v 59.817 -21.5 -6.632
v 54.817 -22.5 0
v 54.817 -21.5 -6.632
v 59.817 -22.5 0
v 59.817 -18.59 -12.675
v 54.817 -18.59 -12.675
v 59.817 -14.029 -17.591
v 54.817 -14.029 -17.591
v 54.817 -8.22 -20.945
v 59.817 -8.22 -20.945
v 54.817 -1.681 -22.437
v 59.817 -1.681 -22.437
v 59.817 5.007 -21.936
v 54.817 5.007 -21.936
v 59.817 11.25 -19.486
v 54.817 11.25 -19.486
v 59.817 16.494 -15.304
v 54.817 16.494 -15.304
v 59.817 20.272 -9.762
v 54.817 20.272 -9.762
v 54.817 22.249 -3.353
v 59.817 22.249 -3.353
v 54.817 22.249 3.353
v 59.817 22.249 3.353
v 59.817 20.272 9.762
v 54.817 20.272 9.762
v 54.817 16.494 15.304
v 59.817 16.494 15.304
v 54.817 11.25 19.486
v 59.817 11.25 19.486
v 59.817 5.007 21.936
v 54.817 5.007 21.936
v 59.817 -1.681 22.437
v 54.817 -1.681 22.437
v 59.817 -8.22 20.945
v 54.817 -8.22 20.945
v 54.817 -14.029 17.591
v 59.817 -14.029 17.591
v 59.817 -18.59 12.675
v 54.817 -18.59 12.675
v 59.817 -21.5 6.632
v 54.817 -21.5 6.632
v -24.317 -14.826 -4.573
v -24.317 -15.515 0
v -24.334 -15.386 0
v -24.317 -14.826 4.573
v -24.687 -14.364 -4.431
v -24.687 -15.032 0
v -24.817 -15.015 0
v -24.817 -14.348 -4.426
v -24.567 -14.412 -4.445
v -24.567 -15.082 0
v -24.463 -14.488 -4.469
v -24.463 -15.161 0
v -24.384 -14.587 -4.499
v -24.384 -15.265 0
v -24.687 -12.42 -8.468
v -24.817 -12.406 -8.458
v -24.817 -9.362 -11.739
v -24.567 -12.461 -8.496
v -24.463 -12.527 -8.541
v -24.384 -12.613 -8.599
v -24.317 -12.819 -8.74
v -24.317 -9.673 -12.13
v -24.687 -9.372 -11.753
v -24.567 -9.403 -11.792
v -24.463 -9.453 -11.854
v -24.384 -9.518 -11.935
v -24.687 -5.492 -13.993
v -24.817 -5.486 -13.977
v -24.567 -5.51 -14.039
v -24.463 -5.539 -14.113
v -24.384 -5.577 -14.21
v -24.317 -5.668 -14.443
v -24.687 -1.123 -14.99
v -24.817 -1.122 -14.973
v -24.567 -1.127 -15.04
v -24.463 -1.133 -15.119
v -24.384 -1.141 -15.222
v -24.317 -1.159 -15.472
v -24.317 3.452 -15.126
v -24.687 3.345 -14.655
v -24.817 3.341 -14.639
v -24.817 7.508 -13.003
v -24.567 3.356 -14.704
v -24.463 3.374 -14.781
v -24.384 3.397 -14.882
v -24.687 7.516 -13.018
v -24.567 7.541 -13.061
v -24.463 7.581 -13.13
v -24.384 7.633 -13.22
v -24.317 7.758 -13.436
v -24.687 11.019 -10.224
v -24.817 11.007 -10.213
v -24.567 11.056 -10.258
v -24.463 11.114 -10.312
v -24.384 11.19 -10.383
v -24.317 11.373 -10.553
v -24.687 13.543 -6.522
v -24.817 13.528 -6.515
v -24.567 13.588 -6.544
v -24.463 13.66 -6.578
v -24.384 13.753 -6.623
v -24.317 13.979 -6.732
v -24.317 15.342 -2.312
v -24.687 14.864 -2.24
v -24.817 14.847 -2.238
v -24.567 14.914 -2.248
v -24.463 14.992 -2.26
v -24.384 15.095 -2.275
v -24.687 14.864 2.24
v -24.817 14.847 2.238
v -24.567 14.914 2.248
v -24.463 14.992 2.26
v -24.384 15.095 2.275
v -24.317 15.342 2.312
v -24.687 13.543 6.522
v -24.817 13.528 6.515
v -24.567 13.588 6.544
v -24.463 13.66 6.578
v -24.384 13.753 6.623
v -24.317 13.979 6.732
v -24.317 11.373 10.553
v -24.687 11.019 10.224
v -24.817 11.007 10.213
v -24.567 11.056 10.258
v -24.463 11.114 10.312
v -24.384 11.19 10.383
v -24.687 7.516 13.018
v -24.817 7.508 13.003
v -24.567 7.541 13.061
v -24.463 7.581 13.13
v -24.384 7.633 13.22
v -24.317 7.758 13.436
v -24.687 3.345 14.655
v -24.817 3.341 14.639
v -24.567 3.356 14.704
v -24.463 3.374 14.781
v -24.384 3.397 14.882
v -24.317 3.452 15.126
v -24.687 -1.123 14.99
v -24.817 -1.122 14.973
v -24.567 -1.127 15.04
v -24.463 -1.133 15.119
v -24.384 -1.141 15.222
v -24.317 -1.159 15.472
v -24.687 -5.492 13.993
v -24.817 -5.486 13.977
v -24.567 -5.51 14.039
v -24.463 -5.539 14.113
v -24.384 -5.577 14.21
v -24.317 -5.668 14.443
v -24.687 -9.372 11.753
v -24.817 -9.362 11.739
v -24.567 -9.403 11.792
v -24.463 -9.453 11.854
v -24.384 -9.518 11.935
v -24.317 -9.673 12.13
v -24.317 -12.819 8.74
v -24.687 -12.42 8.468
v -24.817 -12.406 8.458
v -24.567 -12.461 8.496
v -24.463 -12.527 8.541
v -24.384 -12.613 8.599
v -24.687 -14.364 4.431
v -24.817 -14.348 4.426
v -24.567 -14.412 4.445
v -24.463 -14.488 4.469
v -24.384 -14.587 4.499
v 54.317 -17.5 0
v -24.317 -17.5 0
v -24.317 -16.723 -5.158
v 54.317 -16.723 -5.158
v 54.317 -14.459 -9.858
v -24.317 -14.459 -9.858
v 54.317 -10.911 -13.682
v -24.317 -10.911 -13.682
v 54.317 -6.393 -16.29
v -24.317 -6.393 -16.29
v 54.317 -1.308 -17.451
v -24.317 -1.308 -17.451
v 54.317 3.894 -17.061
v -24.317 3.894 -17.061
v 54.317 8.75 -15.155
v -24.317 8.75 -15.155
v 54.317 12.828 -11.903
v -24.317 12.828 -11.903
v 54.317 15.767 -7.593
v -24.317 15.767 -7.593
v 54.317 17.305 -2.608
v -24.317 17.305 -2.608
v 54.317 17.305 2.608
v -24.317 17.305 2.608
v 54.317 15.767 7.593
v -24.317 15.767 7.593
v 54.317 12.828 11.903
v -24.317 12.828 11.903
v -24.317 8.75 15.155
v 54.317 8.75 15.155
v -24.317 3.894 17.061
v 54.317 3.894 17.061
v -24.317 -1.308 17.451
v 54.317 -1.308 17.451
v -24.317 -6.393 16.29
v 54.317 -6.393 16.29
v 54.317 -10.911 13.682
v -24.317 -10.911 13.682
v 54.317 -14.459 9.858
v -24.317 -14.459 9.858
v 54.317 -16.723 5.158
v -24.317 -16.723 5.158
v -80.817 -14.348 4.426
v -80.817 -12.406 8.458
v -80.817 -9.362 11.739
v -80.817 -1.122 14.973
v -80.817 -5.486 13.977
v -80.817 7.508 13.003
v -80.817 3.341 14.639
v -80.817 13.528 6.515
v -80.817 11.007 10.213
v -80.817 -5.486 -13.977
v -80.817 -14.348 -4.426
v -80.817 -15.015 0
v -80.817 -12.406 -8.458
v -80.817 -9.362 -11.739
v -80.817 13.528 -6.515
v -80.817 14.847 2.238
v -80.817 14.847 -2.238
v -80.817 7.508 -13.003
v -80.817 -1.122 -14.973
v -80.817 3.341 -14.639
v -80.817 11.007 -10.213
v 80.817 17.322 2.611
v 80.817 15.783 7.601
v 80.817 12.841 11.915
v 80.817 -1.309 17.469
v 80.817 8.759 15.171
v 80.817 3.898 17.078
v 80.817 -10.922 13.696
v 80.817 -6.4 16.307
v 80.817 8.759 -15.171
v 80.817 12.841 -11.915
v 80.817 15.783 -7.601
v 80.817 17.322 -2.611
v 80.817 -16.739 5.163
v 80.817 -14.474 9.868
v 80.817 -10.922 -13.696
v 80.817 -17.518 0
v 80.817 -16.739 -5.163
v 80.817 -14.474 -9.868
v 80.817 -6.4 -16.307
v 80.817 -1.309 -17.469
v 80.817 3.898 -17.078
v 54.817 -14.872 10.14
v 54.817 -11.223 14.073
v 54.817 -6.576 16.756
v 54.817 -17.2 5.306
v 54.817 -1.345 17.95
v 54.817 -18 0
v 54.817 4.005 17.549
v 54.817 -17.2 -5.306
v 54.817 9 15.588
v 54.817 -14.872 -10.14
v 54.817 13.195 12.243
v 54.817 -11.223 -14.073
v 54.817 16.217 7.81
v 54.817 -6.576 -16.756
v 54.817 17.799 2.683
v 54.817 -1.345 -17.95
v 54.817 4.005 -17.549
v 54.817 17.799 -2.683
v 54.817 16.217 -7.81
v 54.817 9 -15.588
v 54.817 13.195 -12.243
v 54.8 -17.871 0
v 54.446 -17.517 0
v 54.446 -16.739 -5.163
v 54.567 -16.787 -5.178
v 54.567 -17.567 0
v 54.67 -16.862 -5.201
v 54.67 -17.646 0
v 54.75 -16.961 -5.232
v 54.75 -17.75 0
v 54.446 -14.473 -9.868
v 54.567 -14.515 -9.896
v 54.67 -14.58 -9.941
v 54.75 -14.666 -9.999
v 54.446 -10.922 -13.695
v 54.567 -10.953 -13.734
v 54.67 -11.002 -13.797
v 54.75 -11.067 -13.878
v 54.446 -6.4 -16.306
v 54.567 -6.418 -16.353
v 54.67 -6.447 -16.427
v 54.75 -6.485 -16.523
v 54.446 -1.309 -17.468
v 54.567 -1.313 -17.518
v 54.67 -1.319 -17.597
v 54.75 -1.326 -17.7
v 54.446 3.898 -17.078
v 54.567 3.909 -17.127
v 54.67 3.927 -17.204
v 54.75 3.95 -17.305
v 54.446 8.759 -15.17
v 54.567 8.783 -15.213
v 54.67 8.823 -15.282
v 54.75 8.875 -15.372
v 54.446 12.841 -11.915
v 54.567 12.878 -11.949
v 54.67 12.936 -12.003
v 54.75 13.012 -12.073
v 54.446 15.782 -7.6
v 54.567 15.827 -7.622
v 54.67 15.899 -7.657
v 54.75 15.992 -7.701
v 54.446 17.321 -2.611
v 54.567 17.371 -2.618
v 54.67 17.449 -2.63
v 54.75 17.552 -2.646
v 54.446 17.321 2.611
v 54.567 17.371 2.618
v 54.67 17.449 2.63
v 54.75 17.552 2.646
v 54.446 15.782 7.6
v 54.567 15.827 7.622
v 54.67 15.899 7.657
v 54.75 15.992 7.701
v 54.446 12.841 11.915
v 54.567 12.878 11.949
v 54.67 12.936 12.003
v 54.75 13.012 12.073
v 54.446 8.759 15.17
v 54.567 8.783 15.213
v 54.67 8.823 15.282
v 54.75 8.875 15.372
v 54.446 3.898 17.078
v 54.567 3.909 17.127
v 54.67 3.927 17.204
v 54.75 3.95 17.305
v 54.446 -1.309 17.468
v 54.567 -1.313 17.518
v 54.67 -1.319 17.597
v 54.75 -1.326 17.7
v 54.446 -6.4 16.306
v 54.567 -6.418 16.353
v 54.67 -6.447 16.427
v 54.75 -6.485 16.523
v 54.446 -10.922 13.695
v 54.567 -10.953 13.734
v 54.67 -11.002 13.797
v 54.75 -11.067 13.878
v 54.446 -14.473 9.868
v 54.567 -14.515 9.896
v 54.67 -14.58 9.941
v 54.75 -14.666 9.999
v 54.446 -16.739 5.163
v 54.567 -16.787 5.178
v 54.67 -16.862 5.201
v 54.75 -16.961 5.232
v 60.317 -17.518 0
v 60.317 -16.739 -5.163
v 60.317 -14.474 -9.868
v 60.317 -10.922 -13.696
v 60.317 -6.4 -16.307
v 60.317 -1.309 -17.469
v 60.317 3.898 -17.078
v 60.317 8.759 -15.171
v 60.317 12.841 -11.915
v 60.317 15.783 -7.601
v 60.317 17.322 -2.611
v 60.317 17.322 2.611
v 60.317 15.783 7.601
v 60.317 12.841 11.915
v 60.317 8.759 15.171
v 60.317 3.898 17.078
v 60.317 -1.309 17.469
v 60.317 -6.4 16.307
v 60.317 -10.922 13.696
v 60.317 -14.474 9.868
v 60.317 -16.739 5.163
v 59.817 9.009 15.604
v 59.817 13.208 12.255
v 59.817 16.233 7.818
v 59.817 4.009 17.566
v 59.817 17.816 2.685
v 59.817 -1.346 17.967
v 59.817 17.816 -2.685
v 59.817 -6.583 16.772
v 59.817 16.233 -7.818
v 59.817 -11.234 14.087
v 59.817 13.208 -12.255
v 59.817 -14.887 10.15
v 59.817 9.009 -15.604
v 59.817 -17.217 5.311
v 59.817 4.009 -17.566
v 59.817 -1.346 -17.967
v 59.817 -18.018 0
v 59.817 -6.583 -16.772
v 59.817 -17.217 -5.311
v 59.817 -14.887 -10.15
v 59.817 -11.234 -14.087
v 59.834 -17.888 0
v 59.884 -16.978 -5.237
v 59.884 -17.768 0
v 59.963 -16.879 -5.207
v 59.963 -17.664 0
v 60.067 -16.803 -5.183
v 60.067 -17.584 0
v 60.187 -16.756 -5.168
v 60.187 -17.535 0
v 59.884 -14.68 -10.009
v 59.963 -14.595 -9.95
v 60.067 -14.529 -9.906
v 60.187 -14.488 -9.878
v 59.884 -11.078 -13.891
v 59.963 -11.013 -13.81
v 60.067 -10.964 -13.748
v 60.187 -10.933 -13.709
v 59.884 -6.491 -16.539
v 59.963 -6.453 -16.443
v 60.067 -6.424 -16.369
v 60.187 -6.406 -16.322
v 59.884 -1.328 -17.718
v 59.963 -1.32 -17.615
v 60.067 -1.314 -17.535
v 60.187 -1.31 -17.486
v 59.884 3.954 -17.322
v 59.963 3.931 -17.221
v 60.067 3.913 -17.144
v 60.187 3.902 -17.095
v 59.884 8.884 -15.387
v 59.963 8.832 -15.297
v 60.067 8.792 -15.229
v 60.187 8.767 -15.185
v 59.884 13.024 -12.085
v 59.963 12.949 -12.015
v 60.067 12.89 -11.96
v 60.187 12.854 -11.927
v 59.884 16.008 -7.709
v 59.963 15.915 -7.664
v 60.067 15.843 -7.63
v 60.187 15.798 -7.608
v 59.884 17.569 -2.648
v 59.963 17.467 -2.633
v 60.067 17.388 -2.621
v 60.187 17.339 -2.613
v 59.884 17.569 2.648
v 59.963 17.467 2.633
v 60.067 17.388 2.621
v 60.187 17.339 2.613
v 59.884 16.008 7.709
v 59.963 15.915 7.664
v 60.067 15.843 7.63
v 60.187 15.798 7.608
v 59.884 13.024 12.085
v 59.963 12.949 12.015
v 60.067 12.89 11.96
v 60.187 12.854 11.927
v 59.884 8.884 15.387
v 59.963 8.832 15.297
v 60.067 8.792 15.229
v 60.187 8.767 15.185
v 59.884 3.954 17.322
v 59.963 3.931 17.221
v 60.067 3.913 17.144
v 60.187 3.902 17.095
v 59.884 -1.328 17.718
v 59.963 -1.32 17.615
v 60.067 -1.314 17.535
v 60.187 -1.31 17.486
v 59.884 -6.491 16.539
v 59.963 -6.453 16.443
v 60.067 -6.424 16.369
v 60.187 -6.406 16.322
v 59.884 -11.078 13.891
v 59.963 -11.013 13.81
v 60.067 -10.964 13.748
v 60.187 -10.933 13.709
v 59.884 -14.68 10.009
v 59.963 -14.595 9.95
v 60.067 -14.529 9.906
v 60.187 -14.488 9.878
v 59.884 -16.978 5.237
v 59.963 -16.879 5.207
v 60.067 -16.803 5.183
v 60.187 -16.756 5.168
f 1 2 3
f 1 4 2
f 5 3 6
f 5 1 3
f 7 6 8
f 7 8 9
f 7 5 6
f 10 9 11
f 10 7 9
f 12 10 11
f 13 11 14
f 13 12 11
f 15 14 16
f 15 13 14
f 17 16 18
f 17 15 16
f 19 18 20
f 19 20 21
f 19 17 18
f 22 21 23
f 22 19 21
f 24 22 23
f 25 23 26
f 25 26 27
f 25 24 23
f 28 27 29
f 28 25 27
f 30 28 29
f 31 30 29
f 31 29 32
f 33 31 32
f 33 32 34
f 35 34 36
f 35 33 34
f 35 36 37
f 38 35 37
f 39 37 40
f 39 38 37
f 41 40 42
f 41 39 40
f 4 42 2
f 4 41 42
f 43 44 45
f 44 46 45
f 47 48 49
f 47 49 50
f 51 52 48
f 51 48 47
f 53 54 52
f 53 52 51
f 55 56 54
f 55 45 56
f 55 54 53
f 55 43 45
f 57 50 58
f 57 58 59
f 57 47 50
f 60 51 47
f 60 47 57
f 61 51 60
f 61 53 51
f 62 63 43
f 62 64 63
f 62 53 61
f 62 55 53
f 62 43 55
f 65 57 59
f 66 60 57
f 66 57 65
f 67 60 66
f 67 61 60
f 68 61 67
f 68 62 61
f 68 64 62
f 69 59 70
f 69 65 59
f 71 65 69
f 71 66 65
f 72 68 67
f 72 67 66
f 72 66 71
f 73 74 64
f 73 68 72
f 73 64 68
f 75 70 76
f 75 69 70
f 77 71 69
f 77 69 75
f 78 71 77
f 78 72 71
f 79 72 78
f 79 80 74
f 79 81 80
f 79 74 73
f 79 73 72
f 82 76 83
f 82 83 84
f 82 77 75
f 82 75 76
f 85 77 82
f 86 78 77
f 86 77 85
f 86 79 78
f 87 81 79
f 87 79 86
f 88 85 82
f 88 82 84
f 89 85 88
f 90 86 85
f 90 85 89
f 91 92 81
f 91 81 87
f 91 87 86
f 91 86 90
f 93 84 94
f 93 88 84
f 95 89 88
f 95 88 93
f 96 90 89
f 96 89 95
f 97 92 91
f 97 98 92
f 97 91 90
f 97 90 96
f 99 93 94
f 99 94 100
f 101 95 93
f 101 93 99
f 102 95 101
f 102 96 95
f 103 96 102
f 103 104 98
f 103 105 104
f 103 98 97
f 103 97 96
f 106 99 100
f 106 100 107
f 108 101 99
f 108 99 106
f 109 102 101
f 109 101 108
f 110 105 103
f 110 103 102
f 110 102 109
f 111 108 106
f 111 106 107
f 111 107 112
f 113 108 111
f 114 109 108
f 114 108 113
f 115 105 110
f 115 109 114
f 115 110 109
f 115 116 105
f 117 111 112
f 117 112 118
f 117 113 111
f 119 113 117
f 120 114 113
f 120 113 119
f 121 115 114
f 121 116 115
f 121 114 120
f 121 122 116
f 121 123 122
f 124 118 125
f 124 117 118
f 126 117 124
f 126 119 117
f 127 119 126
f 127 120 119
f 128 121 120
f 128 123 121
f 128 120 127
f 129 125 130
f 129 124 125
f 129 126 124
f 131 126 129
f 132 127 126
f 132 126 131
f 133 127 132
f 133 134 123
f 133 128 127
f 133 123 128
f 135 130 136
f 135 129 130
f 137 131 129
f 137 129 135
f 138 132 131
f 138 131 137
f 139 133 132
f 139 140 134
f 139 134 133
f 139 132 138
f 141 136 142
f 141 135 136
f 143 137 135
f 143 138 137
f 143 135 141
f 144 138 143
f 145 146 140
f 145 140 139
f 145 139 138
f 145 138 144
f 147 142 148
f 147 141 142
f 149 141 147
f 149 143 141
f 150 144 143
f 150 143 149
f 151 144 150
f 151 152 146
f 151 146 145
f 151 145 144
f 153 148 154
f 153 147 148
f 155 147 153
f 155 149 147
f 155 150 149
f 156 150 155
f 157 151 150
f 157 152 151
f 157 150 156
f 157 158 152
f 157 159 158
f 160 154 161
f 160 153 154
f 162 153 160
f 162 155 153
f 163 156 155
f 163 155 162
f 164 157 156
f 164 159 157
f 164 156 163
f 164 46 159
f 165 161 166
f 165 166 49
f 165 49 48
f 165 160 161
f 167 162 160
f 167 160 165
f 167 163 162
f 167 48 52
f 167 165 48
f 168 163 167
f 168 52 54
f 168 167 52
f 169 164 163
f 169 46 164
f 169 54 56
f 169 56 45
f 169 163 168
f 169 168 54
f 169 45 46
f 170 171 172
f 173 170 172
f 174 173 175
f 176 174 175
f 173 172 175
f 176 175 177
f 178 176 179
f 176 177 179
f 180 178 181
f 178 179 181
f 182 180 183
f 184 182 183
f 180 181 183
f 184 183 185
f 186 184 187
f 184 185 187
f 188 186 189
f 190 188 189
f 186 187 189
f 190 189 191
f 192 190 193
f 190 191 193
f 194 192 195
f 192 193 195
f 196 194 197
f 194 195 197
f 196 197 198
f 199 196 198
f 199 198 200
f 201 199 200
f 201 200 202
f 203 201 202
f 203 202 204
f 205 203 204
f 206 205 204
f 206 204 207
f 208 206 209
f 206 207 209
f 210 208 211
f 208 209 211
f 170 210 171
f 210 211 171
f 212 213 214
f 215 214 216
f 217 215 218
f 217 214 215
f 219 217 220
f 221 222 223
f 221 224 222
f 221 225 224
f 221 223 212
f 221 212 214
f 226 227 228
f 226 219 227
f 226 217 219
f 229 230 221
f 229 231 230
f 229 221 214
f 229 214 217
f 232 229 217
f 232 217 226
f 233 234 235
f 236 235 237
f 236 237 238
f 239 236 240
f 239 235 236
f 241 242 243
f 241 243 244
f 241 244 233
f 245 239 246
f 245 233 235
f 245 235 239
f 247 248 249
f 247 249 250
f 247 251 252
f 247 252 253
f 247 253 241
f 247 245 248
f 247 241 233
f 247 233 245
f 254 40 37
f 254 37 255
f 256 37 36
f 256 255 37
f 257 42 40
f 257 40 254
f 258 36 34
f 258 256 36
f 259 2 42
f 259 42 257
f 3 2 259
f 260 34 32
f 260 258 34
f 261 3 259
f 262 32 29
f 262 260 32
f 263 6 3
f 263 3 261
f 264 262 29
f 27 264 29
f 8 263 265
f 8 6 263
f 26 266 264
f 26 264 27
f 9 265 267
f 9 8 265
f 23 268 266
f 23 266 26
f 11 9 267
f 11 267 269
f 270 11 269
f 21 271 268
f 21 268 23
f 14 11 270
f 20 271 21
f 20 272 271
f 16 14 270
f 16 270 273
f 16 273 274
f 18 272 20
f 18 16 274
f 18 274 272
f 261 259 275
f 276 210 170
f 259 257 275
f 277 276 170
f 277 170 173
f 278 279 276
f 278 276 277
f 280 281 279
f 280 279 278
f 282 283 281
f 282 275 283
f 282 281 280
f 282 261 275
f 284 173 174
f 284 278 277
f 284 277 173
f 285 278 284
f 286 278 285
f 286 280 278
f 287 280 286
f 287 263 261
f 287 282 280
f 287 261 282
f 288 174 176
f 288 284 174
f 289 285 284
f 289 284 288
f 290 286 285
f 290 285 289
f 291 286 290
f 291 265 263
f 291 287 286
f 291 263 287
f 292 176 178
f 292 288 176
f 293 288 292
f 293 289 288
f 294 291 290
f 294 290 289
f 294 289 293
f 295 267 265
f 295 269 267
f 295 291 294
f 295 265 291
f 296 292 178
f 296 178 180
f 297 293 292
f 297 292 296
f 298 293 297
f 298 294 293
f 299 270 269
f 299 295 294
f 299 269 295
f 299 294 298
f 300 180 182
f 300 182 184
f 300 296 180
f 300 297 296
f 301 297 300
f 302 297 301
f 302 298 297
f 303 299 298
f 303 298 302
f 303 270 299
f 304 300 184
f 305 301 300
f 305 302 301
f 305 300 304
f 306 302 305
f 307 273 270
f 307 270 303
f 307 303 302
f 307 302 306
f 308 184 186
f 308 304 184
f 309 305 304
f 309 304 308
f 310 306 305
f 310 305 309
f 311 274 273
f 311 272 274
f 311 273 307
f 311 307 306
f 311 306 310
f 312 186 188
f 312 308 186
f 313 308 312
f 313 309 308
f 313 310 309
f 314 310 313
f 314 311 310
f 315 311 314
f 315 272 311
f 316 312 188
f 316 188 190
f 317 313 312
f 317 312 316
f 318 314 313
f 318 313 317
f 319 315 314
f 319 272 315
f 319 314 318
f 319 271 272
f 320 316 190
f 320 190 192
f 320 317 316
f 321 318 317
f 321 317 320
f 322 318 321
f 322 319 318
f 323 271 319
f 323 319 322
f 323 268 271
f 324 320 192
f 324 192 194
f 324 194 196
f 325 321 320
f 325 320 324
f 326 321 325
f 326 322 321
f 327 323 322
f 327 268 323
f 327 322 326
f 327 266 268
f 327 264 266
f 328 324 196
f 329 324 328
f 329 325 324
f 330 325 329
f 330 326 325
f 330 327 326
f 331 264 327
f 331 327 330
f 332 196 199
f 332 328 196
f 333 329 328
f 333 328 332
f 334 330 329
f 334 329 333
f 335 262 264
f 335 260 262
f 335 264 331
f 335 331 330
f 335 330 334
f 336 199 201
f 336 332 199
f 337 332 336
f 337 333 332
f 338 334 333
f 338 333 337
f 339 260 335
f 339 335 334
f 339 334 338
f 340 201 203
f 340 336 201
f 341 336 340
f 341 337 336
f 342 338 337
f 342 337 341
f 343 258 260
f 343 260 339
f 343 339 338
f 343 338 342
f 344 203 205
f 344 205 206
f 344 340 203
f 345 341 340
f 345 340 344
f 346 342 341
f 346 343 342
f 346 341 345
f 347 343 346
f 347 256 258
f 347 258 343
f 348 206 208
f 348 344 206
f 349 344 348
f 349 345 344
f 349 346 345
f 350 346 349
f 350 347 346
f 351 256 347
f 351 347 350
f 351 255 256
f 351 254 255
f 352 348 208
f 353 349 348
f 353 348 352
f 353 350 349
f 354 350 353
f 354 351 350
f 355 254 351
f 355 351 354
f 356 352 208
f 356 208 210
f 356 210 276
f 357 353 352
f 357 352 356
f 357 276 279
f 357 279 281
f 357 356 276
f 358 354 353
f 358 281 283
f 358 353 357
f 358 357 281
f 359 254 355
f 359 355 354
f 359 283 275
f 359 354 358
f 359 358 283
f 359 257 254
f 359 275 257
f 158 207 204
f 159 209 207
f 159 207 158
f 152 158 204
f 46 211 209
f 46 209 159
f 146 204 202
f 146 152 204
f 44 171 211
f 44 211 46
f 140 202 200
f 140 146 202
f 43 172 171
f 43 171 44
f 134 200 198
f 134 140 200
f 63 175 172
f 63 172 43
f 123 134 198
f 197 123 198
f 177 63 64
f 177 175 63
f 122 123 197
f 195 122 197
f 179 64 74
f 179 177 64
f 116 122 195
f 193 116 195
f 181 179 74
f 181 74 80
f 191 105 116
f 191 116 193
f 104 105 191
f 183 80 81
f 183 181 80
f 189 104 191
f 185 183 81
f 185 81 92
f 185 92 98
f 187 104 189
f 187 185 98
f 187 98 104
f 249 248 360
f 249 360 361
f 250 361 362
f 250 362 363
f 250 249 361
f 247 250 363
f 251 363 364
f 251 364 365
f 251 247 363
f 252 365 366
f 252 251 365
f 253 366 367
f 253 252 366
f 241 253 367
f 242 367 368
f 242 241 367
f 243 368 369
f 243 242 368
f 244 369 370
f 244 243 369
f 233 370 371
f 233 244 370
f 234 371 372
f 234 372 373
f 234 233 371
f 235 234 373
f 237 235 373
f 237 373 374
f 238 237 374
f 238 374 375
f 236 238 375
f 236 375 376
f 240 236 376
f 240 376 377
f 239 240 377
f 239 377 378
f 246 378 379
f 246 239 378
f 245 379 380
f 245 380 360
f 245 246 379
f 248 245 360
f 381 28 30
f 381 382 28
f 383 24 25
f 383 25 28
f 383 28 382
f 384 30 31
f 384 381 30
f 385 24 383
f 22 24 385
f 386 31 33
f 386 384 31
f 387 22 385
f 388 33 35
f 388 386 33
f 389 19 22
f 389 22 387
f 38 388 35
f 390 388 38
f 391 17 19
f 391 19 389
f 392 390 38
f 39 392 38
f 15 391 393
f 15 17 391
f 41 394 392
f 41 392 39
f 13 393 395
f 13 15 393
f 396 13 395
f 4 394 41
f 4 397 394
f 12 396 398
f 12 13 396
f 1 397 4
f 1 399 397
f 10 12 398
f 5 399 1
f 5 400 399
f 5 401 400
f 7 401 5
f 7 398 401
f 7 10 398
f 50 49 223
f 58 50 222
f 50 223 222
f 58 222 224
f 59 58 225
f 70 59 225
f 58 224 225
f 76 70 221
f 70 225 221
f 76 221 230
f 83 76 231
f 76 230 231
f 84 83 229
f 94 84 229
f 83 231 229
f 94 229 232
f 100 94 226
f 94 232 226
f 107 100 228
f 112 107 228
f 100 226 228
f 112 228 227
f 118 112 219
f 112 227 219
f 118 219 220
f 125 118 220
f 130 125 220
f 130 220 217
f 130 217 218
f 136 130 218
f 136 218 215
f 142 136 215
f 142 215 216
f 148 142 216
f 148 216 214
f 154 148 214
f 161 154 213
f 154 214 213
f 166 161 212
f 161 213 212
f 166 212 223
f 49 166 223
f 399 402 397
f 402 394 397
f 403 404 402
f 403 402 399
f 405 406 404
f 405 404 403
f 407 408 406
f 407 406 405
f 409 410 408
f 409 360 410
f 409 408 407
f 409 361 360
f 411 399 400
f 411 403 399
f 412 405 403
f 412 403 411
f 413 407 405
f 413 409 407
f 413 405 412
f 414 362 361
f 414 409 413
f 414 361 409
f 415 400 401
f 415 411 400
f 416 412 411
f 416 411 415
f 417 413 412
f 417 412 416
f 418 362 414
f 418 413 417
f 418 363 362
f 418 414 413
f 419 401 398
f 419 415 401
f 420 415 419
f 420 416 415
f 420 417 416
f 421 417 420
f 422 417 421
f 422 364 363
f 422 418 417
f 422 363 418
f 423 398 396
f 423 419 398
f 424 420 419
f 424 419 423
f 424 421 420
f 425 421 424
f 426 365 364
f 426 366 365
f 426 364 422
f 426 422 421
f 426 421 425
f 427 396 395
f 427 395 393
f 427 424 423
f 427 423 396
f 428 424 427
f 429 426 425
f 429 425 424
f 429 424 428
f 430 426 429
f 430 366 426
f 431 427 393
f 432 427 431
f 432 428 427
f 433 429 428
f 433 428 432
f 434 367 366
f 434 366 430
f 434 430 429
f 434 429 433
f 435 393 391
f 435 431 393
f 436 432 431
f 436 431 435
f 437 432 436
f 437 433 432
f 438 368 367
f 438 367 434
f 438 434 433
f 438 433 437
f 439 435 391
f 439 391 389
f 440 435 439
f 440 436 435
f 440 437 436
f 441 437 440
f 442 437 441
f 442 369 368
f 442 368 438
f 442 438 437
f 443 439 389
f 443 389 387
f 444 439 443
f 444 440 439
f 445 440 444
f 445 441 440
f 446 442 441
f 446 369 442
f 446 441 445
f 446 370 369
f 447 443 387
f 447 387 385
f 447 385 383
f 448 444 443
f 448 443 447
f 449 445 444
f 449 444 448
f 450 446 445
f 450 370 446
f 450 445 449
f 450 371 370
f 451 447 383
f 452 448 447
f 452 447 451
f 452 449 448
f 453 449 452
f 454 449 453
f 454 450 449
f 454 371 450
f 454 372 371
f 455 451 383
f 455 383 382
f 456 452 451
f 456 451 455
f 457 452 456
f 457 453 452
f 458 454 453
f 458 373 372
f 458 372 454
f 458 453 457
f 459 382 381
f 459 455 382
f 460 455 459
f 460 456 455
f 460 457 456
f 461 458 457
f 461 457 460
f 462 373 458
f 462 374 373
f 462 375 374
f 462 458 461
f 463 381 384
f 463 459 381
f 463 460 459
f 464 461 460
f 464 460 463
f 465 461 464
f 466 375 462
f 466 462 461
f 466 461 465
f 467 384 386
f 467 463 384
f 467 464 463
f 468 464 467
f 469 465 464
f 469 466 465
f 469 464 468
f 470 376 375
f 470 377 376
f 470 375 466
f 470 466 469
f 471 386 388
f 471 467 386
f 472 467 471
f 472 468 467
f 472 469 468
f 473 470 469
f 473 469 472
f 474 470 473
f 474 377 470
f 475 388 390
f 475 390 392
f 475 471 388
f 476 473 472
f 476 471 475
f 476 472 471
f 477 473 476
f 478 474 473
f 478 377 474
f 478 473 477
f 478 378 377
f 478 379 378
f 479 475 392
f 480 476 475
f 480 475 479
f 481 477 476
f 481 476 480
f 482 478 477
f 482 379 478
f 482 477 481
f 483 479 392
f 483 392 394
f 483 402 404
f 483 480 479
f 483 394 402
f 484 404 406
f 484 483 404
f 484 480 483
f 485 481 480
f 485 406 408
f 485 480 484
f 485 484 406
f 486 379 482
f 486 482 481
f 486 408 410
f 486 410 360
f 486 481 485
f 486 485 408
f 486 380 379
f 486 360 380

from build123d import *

# Parameters (mm, degrees)
FILLET1_R = 0.5


with BuildPart() as part:
    # Sketch1 → Revolve1 (revolve)
    with BuildSketch(Plane.XY, mode=Mode.PRIVATE) as revolve1_sk:
        Polygon((-80.816688046, 15.015), (-37.316688046, 15.015), (-24.316688046, 15.015), (-24.316688046, 17.5), (27.280476237, 17.5), (54.816688046, 17.5), (54.816688046, 22.5), (59.816688046, 22.5), (59.816688046, 17.5175), (80.816688046, 17.5175), (80.816688046, 0), (-80.816688046, 0), align=None)
    revolve(revolve1_sk.sketch.rotate(Axis((-91.454349808, 0, 0), (1, 0, 0)), 180), axis=Axis((-91.454349808, 0, 0), (1, 0, 0)))

    # Fillet1
    fillet1_edges = [part.edges().sort_by_distance(p)[0] for p in [
        (-24.316688046, 15.015, 0),
        (54.816688046, 17.5, 0),
        (59.816688046, 17.5175, 0),
    ]]
    fillet(fillet1_edges, radius=FILLET1_R)


solid = part.part
